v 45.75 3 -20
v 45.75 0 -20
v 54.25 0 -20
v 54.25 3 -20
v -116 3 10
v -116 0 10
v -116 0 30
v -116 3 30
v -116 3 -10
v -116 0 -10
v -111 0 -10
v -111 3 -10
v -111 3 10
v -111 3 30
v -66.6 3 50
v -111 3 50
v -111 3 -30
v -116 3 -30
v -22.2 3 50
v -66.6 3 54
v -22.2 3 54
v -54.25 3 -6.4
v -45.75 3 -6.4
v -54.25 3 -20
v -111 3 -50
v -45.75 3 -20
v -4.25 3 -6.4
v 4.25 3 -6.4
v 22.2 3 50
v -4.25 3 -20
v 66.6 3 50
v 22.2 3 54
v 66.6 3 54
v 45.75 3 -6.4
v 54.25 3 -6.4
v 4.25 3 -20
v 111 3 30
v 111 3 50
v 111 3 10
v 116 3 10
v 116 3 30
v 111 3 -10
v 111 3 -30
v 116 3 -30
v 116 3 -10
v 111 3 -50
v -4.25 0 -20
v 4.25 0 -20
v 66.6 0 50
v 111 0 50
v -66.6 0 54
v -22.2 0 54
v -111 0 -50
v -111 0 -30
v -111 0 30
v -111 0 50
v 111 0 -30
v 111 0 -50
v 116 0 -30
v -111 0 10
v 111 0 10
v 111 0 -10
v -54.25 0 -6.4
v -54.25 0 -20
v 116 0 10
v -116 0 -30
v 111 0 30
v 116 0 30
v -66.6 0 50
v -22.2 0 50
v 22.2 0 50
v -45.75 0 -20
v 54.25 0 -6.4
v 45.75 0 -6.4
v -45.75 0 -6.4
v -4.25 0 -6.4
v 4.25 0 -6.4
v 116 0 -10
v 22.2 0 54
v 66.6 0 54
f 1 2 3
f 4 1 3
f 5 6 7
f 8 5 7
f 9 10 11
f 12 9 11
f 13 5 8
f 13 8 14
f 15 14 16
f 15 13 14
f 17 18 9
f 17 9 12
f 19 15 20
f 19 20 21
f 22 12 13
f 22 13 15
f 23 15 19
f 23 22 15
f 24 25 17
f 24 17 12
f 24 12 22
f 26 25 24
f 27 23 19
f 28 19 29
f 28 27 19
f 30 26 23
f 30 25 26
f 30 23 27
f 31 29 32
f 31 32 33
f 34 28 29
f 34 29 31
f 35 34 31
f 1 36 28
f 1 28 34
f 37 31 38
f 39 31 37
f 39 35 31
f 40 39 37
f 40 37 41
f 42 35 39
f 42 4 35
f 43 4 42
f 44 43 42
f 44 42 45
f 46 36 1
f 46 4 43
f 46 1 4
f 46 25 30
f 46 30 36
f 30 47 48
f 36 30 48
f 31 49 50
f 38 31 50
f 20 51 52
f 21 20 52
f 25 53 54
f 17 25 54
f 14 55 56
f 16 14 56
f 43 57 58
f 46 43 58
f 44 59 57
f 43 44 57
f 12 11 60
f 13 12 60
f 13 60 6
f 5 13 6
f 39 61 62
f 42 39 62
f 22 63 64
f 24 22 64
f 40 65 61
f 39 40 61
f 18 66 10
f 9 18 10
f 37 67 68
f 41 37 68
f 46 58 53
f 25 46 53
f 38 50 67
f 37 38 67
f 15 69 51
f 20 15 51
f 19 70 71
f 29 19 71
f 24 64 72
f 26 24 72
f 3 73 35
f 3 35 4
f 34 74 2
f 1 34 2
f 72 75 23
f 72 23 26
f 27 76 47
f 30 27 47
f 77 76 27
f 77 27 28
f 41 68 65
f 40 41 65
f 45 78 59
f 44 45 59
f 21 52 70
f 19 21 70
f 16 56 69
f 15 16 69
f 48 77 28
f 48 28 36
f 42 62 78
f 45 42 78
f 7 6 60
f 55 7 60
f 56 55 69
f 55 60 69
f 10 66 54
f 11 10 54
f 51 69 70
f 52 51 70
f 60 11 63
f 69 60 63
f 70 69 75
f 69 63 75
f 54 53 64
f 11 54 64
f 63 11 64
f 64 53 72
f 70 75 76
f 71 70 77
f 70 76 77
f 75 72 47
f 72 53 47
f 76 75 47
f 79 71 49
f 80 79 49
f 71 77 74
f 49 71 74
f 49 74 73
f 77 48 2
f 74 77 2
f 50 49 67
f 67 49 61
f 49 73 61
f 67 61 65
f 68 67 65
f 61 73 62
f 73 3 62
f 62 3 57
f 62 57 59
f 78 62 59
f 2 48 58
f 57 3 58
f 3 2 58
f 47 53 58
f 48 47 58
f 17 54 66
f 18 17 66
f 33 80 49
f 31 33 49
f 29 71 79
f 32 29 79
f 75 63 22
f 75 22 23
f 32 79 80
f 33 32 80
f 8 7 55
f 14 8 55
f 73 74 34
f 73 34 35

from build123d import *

# Parameters (mm, degrees)
SKETCH1_W           = 8.5
SKETCH1_H           = 13.6
BOSS_EXTRUDE1_DEPTH = 3


with BuildPart() as part:
    # Sketch1 → Boss-Extrude1 (new body)
    with BuildSketch(Plane(origin=(0, 0, 0), x_dir=(1, 0, 0), z_dir=(0, 1, 0))):
        Polygon((-111, 30), (-116, 30), (-116, 10), (-111, 10), (-111, -10), (-116, -10), (-116, -30), (-111, -30), (-111, -50), (-66.6, -50), (-66.6, -54), (-22.2, -54), (-22.2, -50), (22.2, -50), (22.2, -54), (66.6, -54), (66.6, -50), (111, -50), (111, -30), (116, -30), (116, -10), (111, -10), (111, 10), (116, 10), (116, 30), (111, 30), (111, 50), (-111, 50), align=None)
        with Locations((0, 13.2)):
            Rectangle(SKETCH1_W, SKETCH1_H, mode=Mode.SUBTRACT)
        with Locations((-50, 13.2)):
            Rectangle(SKETCH1_W, SKETCH1_H, mode=Mode.SUBTRACT)
        with Locations((50, 13.2)):
            Rectangle(SKETCH1_W, SKETCH1_H, mode=Mode.SUBTRACT)
    extrude(amount=BOSS_EXTRUDE1_DEPTH)


solid = part.part
